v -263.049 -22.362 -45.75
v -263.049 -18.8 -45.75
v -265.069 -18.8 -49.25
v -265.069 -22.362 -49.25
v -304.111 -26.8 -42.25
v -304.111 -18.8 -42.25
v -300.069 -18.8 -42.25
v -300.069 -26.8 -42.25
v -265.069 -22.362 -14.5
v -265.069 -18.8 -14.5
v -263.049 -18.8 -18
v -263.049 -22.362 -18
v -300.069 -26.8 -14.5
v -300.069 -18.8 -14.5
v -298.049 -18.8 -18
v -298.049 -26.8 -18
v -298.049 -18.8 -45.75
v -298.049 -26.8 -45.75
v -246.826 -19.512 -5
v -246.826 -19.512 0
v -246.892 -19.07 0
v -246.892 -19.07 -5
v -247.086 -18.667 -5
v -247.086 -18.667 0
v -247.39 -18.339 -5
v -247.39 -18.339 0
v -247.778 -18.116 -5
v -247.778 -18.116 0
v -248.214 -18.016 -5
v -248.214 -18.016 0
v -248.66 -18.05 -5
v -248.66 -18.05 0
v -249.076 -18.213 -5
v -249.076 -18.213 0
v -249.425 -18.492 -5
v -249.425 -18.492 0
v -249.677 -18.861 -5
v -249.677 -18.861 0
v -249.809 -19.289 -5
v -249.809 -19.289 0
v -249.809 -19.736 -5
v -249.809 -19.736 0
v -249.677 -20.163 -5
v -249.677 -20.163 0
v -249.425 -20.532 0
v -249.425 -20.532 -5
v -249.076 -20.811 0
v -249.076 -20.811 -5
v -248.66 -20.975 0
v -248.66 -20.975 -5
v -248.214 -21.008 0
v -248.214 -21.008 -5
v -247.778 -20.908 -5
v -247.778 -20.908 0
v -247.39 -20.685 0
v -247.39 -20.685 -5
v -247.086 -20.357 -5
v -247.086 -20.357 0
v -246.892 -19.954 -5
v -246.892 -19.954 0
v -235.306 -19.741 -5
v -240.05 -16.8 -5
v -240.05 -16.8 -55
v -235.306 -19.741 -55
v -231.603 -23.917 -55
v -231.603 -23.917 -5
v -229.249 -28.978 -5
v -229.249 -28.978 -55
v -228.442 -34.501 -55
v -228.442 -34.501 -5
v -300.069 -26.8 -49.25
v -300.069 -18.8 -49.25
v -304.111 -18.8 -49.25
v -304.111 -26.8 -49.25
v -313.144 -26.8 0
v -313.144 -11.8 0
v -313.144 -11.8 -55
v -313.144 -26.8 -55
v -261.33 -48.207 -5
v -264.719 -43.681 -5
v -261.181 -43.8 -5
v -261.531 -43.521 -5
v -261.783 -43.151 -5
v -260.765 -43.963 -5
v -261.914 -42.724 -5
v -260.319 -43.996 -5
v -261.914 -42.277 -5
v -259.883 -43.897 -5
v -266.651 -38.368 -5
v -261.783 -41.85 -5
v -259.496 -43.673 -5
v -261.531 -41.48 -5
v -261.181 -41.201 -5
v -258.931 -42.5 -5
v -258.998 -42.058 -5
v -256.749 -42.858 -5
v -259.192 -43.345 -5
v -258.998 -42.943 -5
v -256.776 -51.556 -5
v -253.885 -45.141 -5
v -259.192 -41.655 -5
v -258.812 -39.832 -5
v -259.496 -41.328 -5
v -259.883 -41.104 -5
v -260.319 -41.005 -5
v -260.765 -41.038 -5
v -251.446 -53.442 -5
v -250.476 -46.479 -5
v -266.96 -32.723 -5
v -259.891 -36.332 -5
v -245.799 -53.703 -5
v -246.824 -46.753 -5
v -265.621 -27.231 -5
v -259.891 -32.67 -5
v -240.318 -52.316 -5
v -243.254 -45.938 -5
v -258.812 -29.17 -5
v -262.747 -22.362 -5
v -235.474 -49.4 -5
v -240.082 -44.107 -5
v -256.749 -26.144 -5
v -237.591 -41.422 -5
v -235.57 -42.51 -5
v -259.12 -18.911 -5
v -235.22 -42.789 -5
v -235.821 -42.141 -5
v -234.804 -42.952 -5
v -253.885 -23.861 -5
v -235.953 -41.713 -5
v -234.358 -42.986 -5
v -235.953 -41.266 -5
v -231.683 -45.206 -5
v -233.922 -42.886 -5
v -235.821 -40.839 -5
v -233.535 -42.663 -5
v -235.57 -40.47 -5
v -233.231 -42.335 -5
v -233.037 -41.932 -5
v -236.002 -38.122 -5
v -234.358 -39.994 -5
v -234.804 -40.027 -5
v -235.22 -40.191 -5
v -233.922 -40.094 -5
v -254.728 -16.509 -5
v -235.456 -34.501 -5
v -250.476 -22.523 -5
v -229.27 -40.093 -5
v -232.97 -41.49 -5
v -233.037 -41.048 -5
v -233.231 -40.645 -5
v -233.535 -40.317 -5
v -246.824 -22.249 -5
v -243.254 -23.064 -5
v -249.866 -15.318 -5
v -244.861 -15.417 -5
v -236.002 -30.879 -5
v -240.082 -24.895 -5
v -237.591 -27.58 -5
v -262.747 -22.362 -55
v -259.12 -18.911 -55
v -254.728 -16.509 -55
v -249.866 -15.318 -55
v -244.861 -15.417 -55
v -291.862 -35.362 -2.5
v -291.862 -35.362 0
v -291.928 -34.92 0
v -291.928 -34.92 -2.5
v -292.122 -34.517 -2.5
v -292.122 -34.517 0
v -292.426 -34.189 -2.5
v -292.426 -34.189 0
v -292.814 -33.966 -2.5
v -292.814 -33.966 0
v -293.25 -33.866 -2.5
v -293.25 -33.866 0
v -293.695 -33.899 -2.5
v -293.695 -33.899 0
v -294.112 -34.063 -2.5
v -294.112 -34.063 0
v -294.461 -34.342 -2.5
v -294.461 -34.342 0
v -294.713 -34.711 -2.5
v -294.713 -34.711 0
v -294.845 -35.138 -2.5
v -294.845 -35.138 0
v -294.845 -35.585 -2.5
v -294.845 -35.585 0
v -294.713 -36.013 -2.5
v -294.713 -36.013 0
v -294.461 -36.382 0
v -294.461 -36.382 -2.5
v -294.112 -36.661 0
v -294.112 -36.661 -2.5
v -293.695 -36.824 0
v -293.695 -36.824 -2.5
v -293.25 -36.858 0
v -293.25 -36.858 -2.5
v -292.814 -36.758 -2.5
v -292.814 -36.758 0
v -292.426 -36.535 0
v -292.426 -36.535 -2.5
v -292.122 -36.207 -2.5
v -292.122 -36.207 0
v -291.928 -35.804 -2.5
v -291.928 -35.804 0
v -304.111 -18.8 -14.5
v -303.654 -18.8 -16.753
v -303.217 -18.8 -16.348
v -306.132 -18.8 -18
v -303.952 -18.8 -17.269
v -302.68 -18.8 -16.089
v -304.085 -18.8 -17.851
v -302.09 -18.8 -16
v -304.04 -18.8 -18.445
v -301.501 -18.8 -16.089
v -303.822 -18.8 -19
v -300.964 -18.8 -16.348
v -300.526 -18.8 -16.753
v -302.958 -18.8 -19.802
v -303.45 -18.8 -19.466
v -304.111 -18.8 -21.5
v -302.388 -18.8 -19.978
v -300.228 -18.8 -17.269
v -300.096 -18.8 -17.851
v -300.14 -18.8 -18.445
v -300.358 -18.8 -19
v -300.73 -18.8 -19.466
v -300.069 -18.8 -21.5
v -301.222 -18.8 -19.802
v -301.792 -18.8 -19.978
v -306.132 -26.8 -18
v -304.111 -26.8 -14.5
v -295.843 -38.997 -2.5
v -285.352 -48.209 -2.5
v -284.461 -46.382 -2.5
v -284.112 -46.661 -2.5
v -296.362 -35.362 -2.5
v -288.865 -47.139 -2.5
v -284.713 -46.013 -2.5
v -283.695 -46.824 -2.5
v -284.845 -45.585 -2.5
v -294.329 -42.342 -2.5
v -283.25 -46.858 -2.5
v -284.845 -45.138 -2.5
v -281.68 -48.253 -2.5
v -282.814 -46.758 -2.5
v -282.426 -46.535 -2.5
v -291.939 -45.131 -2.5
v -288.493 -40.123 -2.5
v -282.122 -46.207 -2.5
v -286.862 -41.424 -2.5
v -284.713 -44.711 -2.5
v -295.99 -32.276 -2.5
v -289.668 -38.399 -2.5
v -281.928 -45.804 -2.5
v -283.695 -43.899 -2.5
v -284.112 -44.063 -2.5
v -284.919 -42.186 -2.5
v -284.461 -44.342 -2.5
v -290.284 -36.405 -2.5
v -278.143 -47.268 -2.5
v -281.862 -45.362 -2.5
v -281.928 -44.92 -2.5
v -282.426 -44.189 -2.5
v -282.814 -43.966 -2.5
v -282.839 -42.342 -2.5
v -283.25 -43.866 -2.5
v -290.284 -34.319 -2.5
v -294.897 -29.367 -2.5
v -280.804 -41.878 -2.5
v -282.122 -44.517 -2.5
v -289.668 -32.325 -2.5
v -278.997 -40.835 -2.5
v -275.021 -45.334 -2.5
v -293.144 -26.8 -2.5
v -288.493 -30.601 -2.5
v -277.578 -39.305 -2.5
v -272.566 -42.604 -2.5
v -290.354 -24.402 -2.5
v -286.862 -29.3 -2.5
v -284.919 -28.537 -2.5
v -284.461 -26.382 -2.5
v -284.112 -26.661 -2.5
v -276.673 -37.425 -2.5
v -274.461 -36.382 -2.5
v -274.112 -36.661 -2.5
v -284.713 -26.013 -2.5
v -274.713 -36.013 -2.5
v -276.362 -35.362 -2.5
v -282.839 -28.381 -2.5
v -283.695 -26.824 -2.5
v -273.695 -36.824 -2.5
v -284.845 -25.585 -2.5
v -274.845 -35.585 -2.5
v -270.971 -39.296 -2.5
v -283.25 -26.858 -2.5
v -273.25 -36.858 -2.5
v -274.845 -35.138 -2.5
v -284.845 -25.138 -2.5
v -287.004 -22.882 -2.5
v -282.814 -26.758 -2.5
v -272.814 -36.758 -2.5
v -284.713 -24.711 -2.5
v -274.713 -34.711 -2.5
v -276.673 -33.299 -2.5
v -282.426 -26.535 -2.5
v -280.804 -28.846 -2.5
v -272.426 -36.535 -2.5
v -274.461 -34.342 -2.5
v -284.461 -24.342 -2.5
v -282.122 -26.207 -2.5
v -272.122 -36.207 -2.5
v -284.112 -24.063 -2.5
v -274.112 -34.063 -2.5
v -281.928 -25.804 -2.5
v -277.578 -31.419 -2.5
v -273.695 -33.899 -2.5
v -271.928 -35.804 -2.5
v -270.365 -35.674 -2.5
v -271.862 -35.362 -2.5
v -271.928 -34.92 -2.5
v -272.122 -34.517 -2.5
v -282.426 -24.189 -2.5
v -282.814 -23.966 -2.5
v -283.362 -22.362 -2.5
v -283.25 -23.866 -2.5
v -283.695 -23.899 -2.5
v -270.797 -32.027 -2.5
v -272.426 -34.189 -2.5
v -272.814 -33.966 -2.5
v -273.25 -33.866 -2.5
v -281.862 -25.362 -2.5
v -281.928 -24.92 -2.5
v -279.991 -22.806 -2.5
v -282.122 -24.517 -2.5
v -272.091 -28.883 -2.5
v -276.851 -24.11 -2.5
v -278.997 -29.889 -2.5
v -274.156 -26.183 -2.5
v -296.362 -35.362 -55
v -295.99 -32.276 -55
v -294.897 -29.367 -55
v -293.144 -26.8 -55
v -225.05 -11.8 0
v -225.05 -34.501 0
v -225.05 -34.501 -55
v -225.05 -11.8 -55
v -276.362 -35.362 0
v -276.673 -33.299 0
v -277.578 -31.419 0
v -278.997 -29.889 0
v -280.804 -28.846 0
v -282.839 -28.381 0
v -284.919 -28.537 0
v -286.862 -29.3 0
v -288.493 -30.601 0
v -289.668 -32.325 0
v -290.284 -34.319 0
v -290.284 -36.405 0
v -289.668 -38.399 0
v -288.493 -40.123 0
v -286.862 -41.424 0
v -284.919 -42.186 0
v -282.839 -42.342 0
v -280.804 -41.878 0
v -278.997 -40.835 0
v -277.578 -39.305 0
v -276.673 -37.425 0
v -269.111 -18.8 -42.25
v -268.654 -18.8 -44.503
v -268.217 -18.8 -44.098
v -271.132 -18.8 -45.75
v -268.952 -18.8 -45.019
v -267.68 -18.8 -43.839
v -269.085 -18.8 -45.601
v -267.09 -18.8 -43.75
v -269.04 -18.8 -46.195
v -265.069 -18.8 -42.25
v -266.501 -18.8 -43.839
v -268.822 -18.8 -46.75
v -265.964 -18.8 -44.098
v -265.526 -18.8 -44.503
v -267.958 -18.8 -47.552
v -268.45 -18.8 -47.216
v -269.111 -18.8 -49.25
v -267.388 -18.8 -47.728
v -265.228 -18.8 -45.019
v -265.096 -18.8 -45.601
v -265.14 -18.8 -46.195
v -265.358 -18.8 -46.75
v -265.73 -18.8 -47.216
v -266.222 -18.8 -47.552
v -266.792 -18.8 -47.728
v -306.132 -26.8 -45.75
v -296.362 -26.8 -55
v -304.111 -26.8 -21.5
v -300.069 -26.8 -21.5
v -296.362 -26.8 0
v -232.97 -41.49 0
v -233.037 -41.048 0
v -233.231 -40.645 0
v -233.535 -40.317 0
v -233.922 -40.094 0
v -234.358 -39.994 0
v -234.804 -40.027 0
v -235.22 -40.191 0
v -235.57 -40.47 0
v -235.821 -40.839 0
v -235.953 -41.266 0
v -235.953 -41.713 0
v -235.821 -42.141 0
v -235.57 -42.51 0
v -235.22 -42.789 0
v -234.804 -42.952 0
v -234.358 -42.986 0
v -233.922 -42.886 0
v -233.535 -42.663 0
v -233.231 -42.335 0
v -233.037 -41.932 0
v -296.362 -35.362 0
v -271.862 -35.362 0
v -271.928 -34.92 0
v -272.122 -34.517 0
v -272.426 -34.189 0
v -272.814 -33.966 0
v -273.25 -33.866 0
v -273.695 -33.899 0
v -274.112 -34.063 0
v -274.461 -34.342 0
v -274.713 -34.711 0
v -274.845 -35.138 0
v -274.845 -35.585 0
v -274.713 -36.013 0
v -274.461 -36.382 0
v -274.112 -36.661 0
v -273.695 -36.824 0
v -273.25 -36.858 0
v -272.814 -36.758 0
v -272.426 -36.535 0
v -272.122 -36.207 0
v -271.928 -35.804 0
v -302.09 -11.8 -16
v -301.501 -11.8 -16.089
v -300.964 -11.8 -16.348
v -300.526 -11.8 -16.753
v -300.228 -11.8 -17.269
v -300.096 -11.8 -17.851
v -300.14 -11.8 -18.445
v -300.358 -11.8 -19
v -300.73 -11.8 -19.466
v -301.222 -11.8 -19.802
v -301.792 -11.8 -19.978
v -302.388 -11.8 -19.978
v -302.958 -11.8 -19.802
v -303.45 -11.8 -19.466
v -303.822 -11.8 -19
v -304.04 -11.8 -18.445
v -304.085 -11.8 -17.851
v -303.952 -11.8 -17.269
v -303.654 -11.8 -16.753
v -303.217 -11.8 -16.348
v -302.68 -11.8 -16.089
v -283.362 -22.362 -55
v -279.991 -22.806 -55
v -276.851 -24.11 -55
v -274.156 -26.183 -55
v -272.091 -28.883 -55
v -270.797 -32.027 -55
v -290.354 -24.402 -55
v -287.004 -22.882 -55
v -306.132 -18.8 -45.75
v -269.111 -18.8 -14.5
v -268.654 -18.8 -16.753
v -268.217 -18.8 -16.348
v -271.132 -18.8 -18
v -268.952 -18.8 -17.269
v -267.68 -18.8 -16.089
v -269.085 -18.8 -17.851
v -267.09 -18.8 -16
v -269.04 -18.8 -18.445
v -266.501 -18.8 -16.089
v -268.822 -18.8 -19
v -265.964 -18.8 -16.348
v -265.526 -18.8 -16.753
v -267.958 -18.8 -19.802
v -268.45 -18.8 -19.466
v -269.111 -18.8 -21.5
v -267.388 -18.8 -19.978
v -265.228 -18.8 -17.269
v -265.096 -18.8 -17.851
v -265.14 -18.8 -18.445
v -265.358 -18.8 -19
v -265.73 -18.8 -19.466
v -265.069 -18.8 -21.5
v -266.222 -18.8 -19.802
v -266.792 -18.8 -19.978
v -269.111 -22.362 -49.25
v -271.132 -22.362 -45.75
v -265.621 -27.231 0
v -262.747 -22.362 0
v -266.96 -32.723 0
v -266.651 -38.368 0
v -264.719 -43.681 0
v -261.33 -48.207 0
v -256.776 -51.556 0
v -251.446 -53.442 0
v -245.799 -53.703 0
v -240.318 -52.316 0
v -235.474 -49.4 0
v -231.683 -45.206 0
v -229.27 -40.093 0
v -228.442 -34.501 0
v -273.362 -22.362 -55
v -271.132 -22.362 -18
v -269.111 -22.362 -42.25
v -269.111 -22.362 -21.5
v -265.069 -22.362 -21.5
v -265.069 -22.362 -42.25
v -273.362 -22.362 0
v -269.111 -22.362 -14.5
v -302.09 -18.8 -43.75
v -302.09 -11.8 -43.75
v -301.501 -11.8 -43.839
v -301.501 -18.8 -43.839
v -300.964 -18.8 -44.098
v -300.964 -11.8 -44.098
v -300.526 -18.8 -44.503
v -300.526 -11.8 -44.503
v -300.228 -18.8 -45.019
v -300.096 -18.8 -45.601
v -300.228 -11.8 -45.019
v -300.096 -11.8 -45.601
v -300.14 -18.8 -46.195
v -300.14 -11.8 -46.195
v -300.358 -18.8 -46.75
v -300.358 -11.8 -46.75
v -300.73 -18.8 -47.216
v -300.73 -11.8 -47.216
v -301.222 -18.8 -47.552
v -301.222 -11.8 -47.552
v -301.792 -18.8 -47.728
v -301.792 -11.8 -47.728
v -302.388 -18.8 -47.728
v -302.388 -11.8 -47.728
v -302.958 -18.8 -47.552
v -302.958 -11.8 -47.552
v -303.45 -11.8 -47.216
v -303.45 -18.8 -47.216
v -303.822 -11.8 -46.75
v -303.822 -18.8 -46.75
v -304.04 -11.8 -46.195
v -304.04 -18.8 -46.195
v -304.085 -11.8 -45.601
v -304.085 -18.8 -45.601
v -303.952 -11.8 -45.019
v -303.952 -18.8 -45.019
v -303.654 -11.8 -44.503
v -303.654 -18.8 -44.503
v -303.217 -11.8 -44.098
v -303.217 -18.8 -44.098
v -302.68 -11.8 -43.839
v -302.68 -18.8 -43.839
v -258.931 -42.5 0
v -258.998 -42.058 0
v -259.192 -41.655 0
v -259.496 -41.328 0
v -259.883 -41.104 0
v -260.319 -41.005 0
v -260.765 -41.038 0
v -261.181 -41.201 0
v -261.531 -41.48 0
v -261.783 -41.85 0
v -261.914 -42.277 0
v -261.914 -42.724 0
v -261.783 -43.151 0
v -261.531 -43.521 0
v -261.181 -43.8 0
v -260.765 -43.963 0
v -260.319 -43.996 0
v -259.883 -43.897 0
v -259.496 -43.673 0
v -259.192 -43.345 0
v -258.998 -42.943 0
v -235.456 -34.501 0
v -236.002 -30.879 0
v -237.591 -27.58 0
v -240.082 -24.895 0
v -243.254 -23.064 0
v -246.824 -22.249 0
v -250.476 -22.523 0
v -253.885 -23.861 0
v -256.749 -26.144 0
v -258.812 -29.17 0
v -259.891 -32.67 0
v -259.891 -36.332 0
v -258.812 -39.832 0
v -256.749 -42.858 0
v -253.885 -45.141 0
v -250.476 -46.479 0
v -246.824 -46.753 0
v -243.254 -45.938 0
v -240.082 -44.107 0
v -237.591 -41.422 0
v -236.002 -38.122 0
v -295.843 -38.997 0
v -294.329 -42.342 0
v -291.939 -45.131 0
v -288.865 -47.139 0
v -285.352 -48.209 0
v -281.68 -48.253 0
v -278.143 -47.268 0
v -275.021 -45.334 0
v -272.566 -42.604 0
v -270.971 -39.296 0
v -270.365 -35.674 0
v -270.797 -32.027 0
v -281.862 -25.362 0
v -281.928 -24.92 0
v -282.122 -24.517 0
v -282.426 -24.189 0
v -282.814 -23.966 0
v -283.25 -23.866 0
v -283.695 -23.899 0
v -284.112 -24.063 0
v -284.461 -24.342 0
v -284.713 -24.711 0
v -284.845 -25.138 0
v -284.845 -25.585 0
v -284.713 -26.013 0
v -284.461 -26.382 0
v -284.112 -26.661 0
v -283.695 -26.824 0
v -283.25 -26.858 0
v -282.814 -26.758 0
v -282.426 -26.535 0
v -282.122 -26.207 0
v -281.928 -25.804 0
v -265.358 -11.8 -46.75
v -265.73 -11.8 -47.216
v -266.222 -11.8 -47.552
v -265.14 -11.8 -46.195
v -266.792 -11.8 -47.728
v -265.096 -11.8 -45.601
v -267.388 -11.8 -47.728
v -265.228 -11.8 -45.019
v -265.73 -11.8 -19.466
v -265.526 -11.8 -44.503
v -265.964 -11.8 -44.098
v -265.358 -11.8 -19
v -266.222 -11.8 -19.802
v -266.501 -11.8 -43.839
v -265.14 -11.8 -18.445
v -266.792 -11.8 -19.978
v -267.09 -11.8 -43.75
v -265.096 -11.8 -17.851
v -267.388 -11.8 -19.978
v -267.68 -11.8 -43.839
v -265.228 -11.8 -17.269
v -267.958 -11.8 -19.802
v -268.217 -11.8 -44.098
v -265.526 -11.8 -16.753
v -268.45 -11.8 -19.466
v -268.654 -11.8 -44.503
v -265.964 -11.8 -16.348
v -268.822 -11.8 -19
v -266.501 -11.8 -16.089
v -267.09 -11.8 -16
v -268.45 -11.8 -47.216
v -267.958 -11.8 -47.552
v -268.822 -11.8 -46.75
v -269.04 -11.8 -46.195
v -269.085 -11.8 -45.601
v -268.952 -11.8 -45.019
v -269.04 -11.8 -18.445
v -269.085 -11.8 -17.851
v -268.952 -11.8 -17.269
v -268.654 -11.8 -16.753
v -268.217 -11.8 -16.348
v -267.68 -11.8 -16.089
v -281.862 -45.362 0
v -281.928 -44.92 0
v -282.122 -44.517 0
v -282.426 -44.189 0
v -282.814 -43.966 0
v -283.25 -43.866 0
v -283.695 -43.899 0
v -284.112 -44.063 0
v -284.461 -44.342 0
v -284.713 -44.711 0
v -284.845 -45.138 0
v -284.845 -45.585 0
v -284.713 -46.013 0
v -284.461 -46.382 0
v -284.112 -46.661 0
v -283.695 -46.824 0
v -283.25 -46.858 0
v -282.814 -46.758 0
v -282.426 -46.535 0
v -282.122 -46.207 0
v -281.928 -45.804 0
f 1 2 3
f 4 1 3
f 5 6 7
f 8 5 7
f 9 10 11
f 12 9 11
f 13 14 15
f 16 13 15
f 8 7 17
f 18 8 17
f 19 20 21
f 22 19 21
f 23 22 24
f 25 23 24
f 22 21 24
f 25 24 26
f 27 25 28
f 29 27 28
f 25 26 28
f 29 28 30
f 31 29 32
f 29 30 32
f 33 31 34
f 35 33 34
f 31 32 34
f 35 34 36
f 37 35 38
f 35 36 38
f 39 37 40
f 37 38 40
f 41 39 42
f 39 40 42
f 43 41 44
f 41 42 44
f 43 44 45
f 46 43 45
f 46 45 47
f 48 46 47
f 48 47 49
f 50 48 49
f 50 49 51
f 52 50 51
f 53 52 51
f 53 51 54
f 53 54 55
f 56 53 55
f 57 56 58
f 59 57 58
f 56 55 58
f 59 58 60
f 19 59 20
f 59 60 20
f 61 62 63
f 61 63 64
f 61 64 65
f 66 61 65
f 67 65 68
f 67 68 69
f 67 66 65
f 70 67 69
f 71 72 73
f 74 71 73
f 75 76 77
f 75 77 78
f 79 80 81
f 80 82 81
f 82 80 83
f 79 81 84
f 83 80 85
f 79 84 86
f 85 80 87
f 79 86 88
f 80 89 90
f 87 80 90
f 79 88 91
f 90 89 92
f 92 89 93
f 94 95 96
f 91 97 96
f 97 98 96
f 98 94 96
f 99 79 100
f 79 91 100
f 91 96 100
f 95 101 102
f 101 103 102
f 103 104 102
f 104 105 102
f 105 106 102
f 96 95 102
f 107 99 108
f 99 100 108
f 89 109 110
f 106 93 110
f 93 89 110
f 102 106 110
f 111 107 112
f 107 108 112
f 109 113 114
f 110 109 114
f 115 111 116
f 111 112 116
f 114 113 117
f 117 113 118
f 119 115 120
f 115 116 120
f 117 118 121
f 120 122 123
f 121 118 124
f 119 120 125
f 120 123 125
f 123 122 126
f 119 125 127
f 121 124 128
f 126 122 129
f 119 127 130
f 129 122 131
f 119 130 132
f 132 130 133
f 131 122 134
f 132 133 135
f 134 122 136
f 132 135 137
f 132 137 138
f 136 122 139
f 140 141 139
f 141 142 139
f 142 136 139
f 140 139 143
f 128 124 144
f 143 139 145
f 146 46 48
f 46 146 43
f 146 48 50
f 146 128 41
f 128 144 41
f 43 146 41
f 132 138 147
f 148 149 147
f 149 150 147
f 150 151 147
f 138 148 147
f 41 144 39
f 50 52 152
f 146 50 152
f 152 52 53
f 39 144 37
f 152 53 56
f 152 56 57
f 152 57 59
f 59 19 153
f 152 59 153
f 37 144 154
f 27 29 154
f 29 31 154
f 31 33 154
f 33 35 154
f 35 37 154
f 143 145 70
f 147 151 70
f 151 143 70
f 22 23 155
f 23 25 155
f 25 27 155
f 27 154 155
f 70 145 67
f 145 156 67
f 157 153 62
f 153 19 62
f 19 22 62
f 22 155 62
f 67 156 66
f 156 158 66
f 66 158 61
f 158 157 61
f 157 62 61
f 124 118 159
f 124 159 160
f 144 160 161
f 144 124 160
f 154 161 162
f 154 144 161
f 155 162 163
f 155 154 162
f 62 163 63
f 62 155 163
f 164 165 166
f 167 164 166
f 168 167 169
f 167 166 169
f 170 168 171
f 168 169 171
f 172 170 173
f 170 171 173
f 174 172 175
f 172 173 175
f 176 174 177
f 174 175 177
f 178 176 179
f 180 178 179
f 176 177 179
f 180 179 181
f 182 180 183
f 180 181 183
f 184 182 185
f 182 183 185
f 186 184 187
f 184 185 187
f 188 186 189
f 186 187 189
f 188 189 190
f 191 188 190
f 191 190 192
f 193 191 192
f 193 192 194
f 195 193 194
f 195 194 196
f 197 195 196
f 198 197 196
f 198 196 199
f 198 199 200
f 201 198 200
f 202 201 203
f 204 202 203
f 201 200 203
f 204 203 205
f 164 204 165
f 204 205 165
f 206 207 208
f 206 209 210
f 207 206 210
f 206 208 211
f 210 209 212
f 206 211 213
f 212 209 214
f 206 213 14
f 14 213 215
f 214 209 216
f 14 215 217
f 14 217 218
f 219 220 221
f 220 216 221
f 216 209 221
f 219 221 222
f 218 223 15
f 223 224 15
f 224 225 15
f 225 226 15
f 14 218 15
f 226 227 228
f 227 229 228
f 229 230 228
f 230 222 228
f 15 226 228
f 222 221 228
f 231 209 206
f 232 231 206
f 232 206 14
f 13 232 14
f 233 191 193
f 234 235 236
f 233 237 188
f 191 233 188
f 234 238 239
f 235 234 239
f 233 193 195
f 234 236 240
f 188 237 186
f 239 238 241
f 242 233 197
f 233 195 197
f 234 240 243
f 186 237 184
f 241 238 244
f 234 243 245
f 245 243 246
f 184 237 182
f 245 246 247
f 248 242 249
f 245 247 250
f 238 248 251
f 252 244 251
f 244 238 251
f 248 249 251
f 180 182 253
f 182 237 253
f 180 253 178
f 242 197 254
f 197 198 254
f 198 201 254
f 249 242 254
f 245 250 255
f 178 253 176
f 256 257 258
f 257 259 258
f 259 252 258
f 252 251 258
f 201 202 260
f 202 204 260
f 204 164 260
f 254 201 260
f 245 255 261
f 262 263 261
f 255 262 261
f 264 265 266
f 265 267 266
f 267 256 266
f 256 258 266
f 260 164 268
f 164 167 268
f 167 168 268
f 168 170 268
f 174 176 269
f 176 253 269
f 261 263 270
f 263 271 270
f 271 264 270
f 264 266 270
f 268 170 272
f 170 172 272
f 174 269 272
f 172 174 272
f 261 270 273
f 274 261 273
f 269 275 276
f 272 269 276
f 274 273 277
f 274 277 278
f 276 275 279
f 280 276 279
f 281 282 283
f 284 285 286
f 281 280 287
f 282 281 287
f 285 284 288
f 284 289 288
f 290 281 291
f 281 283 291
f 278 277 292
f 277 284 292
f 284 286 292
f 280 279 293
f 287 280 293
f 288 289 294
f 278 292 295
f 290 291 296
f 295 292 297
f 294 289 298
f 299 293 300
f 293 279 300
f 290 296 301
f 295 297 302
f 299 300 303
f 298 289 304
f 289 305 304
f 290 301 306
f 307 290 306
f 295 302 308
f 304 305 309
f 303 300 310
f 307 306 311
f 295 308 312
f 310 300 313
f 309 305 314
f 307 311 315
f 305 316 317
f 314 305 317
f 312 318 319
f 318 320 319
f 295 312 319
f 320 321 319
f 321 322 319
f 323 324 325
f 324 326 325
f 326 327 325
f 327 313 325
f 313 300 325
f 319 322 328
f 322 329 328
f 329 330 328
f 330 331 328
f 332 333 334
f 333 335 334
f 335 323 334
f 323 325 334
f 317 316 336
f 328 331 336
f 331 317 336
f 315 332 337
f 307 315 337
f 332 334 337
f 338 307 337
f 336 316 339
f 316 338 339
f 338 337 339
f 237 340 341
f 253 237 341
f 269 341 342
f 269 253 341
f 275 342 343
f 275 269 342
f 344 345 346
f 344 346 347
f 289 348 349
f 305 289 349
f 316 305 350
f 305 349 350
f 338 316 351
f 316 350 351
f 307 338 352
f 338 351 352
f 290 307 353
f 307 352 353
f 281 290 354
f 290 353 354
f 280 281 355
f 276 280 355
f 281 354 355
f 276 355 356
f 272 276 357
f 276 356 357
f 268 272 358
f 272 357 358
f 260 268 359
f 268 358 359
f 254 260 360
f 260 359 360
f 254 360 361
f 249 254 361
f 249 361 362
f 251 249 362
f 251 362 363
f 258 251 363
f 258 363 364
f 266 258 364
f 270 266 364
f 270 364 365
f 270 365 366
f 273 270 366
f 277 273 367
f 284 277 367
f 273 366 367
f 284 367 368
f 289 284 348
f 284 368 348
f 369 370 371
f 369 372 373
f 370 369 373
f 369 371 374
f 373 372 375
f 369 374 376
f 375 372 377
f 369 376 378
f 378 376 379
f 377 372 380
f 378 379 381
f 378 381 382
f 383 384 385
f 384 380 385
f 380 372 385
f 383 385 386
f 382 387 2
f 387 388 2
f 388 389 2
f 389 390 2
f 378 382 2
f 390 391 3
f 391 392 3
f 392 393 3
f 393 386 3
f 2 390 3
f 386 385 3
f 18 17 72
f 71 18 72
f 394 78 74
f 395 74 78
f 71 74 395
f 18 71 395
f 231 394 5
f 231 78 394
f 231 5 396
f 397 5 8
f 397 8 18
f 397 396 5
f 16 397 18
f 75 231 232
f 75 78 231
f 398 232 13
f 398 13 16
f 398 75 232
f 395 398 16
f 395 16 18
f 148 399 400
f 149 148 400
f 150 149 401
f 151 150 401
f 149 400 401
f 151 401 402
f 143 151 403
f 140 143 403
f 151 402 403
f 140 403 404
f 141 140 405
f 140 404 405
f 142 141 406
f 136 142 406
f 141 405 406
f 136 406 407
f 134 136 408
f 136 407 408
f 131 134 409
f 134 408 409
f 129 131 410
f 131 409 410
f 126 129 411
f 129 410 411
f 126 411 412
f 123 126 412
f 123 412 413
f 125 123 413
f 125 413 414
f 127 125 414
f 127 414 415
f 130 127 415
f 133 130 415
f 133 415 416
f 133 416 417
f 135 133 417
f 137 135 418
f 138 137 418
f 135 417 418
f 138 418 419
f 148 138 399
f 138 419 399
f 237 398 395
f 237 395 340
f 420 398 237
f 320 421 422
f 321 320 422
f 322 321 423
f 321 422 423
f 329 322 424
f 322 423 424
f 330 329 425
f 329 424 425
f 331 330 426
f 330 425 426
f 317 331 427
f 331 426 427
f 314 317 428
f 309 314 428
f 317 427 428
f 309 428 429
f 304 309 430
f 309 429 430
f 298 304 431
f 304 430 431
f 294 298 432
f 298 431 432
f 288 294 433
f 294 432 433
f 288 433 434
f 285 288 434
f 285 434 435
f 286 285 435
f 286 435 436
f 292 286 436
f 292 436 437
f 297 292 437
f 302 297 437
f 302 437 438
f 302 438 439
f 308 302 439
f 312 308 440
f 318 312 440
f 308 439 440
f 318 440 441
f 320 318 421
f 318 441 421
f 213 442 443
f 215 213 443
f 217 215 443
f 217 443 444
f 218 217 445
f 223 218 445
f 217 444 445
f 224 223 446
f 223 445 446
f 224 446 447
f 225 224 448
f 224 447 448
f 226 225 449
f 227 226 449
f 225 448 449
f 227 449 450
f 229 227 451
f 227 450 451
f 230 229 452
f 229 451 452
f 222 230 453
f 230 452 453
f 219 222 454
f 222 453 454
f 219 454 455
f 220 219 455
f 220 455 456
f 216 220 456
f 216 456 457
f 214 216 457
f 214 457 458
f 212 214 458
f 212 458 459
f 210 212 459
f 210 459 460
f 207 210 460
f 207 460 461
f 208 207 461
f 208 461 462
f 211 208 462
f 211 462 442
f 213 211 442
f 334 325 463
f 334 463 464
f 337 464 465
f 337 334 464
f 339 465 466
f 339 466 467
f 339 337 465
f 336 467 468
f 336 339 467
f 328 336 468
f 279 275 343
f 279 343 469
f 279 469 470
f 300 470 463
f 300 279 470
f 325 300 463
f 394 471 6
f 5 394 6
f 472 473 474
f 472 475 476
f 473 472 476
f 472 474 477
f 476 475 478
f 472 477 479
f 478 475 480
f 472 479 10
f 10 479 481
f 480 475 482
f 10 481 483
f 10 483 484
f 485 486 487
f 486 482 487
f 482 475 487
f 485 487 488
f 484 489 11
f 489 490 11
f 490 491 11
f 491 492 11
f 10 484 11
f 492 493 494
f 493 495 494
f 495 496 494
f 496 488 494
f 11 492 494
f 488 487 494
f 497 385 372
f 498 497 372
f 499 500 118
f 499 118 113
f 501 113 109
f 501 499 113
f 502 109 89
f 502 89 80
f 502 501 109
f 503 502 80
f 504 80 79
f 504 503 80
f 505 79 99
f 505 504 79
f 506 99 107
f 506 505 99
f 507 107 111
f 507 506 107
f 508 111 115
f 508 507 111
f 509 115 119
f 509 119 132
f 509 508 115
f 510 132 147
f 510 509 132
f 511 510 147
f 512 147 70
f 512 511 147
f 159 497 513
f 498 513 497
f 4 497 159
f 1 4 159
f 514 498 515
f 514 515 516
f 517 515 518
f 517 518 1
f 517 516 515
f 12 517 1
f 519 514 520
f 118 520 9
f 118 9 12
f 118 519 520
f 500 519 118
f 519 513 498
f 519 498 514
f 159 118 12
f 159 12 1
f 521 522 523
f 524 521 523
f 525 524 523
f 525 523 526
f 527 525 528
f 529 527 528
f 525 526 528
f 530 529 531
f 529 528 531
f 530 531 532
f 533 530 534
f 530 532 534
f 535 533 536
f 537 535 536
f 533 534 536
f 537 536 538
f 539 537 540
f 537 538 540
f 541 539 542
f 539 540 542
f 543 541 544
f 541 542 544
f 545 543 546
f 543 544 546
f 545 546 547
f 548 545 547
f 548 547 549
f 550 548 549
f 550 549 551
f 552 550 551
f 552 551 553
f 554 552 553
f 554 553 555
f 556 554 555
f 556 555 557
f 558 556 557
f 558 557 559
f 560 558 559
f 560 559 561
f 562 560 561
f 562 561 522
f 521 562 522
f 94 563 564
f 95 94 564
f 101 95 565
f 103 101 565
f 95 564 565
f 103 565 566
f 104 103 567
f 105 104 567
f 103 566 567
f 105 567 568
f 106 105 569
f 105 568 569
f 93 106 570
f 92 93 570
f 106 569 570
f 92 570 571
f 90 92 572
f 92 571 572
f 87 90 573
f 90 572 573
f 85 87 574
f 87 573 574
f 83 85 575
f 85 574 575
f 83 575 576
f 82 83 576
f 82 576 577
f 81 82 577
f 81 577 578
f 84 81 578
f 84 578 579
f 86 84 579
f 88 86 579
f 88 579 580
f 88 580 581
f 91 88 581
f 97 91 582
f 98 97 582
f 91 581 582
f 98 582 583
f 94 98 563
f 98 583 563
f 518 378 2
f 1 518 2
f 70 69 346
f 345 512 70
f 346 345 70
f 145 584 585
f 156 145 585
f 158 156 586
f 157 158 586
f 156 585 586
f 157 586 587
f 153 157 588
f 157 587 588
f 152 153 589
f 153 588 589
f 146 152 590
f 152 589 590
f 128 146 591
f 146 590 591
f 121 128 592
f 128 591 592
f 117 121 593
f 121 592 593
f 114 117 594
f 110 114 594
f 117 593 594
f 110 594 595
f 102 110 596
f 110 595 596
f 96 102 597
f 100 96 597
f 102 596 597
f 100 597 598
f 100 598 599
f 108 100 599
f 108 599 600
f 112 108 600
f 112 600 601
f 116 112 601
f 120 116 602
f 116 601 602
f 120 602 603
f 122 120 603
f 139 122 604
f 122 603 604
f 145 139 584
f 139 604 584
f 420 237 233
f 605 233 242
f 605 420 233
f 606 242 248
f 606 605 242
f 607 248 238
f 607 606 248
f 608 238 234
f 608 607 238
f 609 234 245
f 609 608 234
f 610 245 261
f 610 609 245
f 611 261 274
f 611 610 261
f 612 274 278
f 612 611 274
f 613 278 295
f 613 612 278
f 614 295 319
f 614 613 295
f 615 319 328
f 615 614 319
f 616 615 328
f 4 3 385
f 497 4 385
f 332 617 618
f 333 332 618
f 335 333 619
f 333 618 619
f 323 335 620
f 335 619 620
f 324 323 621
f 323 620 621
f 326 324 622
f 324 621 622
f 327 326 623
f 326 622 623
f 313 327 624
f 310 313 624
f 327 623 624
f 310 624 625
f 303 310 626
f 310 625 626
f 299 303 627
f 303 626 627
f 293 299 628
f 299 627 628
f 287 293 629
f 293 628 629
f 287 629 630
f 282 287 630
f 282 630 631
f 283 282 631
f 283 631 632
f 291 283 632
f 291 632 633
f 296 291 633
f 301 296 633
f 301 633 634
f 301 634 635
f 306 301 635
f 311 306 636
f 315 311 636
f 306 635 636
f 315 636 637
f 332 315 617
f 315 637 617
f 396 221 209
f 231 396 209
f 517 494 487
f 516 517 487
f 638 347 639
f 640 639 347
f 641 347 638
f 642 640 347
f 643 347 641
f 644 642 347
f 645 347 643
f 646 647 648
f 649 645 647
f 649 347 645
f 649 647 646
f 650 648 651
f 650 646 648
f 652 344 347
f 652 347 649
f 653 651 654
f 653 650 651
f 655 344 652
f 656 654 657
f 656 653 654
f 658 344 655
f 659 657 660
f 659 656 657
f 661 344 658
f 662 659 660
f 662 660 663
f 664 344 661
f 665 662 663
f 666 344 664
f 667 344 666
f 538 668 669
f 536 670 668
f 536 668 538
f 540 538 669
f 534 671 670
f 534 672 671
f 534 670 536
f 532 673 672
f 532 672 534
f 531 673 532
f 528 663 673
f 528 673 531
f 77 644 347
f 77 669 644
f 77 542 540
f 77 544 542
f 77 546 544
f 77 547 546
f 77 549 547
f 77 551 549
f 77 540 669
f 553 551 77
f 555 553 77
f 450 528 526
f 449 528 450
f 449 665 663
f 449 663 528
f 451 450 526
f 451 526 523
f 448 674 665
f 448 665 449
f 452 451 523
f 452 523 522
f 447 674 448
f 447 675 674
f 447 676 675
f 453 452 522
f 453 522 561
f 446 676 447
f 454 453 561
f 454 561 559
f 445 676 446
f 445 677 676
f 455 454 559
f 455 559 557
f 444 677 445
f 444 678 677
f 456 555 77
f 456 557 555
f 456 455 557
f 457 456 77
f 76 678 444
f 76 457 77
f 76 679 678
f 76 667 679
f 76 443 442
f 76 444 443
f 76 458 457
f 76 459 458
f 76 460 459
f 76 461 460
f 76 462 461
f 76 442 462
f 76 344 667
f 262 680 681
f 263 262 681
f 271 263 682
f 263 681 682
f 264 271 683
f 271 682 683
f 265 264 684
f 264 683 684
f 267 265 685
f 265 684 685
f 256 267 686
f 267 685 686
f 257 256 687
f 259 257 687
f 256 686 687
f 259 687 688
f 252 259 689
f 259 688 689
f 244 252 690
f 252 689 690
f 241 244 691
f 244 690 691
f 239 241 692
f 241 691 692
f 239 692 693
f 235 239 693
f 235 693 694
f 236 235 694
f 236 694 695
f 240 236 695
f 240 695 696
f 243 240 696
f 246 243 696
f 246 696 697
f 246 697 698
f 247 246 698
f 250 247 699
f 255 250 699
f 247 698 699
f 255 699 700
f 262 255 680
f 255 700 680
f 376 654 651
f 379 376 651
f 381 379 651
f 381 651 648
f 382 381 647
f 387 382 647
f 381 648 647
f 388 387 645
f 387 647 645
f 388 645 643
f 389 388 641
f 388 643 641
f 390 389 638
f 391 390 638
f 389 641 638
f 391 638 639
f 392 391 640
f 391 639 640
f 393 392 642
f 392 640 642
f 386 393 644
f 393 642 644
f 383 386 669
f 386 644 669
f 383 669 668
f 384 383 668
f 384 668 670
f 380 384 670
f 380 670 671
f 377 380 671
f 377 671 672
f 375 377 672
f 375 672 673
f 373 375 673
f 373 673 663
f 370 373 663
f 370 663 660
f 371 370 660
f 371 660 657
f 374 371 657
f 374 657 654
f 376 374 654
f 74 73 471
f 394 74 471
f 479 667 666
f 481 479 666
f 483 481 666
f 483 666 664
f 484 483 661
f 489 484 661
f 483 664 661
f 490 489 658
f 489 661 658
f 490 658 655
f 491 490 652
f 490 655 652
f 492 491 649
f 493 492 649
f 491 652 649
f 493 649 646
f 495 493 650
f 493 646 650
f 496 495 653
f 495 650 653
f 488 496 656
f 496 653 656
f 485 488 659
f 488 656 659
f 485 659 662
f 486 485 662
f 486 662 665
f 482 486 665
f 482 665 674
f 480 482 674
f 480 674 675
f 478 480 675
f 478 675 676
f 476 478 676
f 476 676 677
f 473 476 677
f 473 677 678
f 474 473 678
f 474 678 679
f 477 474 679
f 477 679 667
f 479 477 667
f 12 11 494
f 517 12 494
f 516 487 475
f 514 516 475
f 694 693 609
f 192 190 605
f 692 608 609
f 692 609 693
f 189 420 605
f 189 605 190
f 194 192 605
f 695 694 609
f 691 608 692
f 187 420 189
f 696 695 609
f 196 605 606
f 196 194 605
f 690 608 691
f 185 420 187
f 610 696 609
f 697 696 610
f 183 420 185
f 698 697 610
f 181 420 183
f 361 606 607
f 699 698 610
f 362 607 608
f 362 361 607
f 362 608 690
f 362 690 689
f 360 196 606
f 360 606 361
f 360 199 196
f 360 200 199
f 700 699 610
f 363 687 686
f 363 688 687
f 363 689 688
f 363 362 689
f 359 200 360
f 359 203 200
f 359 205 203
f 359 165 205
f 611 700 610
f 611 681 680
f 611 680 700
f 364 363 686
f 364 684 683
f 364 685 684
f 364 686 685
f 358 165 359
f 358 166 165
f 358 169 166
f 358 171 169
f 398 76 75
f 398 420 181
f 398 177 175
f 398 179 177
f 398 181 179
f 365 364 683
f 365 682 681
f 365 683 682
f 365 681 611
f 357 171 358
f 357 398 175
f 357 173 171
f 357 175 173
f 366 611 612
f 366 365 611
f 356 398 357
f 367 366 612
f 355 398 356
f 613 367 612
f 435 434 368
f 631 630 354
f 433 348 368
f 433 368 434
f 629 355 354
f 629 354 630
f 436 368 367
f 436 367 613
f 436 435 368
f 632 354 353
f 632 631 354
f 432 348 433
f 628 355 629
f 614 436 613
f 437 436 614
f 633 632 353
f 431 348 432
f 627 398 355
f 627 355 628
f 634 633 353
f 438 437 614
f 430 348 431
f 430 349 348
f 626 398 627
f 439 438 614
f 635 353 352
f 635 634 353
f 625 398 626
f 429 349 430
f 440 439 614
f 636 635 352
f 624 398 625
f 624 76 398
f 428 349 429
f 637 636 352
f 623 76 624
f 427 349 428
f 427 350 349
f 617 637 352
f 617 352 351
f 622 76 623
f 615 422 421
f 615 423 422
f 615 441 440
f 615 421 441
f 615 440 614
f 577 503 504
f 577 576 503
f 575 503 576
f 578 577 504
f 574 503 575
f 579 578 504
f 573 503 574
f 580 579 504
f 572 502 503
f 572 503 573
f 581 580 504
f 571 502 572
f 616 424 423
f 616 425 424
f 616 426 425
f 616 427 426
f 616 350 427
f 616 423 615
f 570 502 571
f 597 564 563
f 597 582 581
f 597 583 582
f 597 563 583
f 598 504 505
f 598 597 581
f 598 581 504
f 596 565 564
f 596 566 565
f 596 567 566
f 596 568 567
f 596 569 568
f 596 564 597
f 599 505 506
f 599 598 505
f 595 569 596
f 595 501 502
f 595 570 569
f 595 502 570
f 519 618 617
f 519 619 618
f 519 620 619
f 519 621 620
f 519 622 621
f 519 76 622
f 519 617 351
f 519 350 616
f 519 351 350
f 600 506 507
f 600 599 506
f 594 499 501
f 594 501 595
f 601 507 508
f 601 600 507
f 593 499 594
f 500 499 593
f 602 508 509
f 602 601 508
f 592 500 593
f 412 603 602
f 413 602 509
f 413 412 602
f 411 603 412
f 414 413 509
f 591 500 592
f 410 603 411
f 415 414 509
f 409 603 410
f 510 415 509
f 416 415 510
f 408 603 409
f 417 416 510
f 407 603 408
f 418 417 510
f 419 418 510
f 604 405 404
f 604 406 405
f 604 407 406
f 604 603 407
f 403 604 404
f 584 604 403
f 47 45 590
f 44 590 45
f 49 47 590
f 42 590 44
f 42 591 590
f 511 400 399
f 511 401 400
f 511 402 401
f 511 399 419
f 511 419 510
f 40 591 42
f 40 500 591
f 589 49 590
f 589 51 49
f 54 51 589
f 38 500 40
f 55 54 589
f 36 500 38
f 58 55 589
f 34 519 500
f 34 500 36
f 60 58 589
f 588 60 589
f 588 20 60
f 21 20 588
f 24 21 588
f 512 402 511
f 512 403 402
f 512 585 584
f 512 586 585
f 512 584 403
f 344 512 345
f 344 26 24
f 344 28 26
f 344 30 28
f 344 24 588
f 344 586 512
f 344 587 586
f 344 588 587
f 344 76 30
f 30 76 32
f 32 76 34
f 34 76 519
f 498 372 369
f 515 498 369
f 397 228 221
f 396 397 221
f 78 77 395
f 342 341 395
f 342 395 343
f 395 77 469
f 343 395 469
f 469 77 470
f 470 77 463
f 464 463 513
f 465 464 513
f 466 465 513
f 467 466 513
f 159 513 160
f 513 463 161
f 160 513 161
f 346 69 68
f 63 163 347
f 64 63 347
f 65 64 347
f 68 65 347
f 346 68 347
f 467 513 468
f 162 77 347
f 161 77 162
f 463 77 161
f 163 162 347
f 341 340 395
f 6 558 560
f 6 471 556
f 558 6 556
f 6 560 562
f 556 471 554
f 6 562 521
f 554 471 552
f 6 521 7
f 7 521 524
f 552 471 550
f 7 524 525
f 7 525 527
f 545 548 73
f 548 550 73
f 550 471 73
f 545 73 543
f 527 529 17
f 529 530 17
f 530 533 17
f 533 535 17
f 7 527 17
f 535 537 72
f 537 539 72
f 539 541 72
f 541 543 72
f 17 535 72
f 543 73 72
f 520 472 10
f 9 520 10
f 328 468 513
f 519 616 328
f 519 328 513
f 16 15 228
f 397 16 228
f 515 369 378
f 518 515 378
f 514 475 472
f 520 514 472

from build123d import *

# Parameters (mm, degrees)
SKETCH1_R           = 1.5
SKETCH1_R_2         = 12.286192875
BOSS_EXTRUDE1_DEPTH = 5
SKETCH1_4_R         = 19.3
SKETCH1_4_R_2       = 1.5
SKETCH1_4_R_3       = 12.286192875
BOSS_EXTRUDE2_DEPTH = 5
SKETCH1_5_R         = 13
SKETCH1_5_R_2       = 1.5
SKETCH1_5_R_3       = 7
BOSS_EXTRUDE3_DEPTH = 2.5
BOSS_EXTRUDE4_DEPTH = 55
SKETCH2_R           = 2
CUT_EXTRUDE1_DEPTH  = 321.699634413
CUT_EXTRUDE2_START  = -7
SKETCH2_3_R         = 2
CUT_EXTRUDE2_DEPTH  = 8


with BuildPart() as part:
    # Sketch1 → Boss-Extrude1 (new body)
    with BuildSketch(Plane.XY):
        with BuildLine():
            Line((-225.050004998, -11.8), (-313.144033158, -11.8))
            Line((-313.144033158, -11.8), (-313.144033158, -26.8))
            Line((-313.144033158, -26.8), (-296.361685959, -26.8))
            Line((-296.361685959, -26.8), (-296.361685959, -35.361873818))
            ThreePointArc((-296.361685959, -35.361873818), (-292.554074115, -26.169485663), (-283.361685959, -22.361873818))
            Line((-283.361685959, -22.361873818), (-262.746762324, -22.361873818))
            ThreePointArc((-262.746762324, -22.361873818), (-254.180514838, -52.695300476), (-228.442241035, -34.500833448))
            Line((-228.442241035, -34.500833448), (-225.050004998, -34.500833448))
            Line((-225.050004998, -34.500833448), (-225.050004998, -11.8))
        make_face()
        with Locations((-234.469948601, -41.489842931)):
            Circle(SKETCH1_R, mode=Mode.SUBTRACT)
        with Locations((-248.325727491, -19.512186292)):
            Circle(SKETCH1_R, mode=Mode.SUBTRACT)
        with Locations((-260.431047012, -42.50047112)):
            Circle(SKETCH1_R, mode=Mode.SUBTRACT)
        with Locations((-247.742241035, -34.500833448)):
            Circle(SKETCH1_R_2, mode=Mode.SUBTRACT)
    extrude(amount=-BOSS_EXTRUDE1_DEPTH)

    # Sketch1<4> → Boss-Extrude2 (add)
    # profile 1 of 3: a face of its own
    with BuildSketch(Plane.XY):
        with Locations((-247.742241035, -34.500833448)):
            Circle(SKETCH1_4_R)
        with Locations((-248.325727491, -19.512186292)):
            Circle(SKETCH1_4_R_2, mode=Mode.SUBTRACT)
        with Locations((-260.431047012, -42.50047112)):
            Circle(SKETCH1_4_R_2, mode=Mode.SUBTRACT)
        with Locations((-234.469948601, -41.489842931)):
            Circle(SKETCH1_4_R_2, mode=Mode.SUBTRACT)
        with Locations((-247.742241035, -34.500833448)):
            Circle(SKETCH1_4_R_3, mode=Mode.SUBTRACT)
    # profile 2 of 3: a face of its own
    with BuildSketch(Plane.XY):
        with BuildLine():
            Line((-225.050004998, -16.8), (-225.050004998, -11.8))
            Line((-225.050004998, -11.8), (-313.144033158, -11.8))
            Line((-313.144033158, -11.8), (-313.144033158, -26.8))
            Line((-313.144033158, -26.8), (-296.361685959, -26.8))
            Line((-296.361685959, -26.8), (-293.144033158, -26.8))
            ThreePointArc((-293.144033158, -26.8), (-288.73270264, -23.523285228), (-283.361685959, -22.361873818))
            Line((-283.361685959, -22.361873818), (-273.361685959, -22.361873818))
            Line((-273.361685959, -22.361873818), (-262.746762324, -22.361873818))
            ThreePointArc((-262.746762324, -22.361873818), (-252.335822317, -15.755460392), (-240.050004998, -16.8))
            Line((-240.050004998, -16.8), (-225.050004998, -16.8))
        make_face()
    # profile 3 of 3: a face of its own
    with BuildSketch(Plane.XY):
        with BuildLine():
            Line((-225.050004998, -34.500833448), (-225.050004998, -16.8))
            Line((-225.050004998, -16.8), (-240.050004998, -16.8))
            ThreePointArc((-240.050004998, -16.8), (-231.603000726, -23.917123217), (-228.442241035, -34.500833448))
            Line((-228.442241035, -34.500833448), (-225.050004998, -34.500833448))
        make_face()
    extrude(amount=-BOSS_EXTRUDE2_DEPTH)

    # Sketch1<5> → Boss-Extrude3 (add)
    with BuildSketch(Plane.XY):
        with Locations((-283.361685959, -35.361873818)):
            Circle(SKETCH1_5_R)
        with Locations((-283.361685959, -25.361873818)):
            Circle(SKETCH1_5_R_2, mode=Mode.SUBTRACT)
        with Locations((-293.361685959, -35.361873818)):
            Circle(SKETCH1_5_R_2, mode=Mode.SUBTRACT)
        with Locations((-283.361685959, -45.361873818)):
            Circle(SKETCH1_5_R_2, mode=Mode.SUBTRACT)
        with Locations((-273.361685959, -35.361873818)):
            Circle(SKETCH1_5_R_2, mode=Mode.SUBTRACT)
        with Locations((-283.361685959, -35.361873818)):
            Circle(SKETCH1_5_R_3, mode=Mode.SUBTRACT)
    extrude(amount=-BOSS_EXTRUDE3_DEPTH)

    # Sketch1<6> → Boss-Extrude4 (add)
    with BuildSketch(Plane.XY):
        with BuildLine():
            Line((-270.796630197, -32.027301328), (-273.361685959, -22.361873818))
            Line((-273.361685959, -22.361873818), (-283.361685959, -22.361873818))
            ThreePointArc((-283.361685959, -22.361873818), (-275.435446068, -25.05776196), (-270.796630197, -32.027301328))
        make_face()
        with BuildLine():
            Line((-225.050004998, -34.500833448), (-225.050004998, -16.8))
            Line((-225.050004998, -16.8), (-240.050004998, -16.8))
            ThreePointArc((-240.050004998, -16.8), (-231.603000726, -23.917123217), (-228.442241035, -34.500833448))
            Line((-228.442241035, -34.500833448), (-225.050004998, -34.500833448))
        make_face()
        with BuildLine():
            Line((-293.144033158, -26.8), (-296.361685959, -26.8))
            Line((-296.361685959, -26.8), (-296.361685959, -35.361873818))
            ThreePointArc((-296.361685959, -35.361873818), (-295.530714548, -30.788609863), (-293.144033158, -26.8))
        make_face()
        with BuildLine():
            Line((-225.050004998, -16.8), (-225.050004998, -11.8))
            Line((-225.050004998, -11.8), (-313.144033158, -11.8))
            Line((-313.144033158, -11.8), (-313.144033158, -26.8))
            Line((-313.144033158, -26.8), (-296.361685959, -26.8))
            Line((-296.361685959, -26.8), (-293.144033158, -26.8))
            ThreePointArc((-293.144033158, -26.8), (-288.73270264, -23.523285228), (-283.361685959, -22.361873818))
            Line((-283.361685959, -22.361873818), (-273.361685959, -22.361873818))
            Line((-273.361685959, -22.361873818), (-262.746762324, -22.361873818))
            ThreePointArc((-262.746762324, -22.361873818), (-252.335822317, -15.755460392), (-240.050004998, -16.8))
            Line((-240.050004998, -16.8), (-225.050004998, -16.8))
        make_face()
    extrude(amount=-BOSS_EXTRUDE4_DEPTH)

    # Sketch2 → Cut-Extrude1 (cut, through all)
    with BuildSketch(Plane(origin=(0, -11.8, 0), x_dir=(1, 0, 0), z_dir=(0, 1, 0))):
        with Locations(Location((-302.09015188, 45.75, 0), (0, 0, 270))):
            Circle(SKETCH2_R)
        with Locations(Location((-302.09015188, 18, 0), (0, 0, 270))):
            Circle(SKETCH2_R)
        with Locations(Location((-267.09015188, 18, 0), (0, 0, 270))):
            Circle(SKETCH2_R)
        with Locations(Location((-267.09015188, 45.75, 0), (0, 0, 270))):
            Circle(SKETCH2_R)
    extrude(amount=-CUT_EXTRUDE1_DEPTH, mode=Mode.SUBTRACT)

    # Sketch2<3> → Cut-Extrude2 (cut)
    # profile 1 of 4: a face of its own
    with BuildSketch(Plane(origin=(0, -11.8, 0), x_dir=(1, 0, 0), z_dir=(0, 1, 0)).offset(CUT_EXTRUDE2_START)):
        Polygon((-300.069425938, 42.25), (-298.048699996, 45.75), (-300.069425938, 49.25), (-304.110877823, 49.25), (-306.131603765, 45.75), (-304.110877823, 42.25), align=None)
        with Locations(Location((-302.09015188, 45.75, 0), (0, 0, 270))):
            Circle(SKETCH2_3_R, mode=Mode.SUBTRACT)
    # profile 2 of 4: a face of its own
    with BuildSketch(Plane(origin=(0, -11.8, 0), x_dir=(1, 0, 0), z_dir=(0, 1, 0)).offset(CUT_EXTRUDE2_START)):
        Polygon((-300.069425938, 14.5), (-298.048699996, 18), (-300.069425938, 21.5), (-304.110877823, 21.5), (-306.131603765, 18), (-304.110877823, 14.5), align=None)
        with Locations(Location((-302.09015188, 18, 0), (0, 0, 270))):
            Circle(SKETCH2_3_R, mode=Mode.SUBTRACT)
    # profile 3 of 4: a face of its own
    with BuildSketch(Plane(origin=(0, -11.8, 0), x_dir=(1, 0, 0), z_dir=(0, 1, 0)).offset(CUT_EXTRUDE2_START)):
        Polygon((-269.110877823, 21.5), (-271.131603765, 18), (-269.110877823, 14.5), (-265.069425938, 14.5), (-263.048699996, 18), (-265.069425938, 21.5), align=None)
        with Locations(Location((-267.09015188, 18, 0), (0, 0, 270))):
            Circle(SKETCH2_3_R, mode=Mode.SUBTRACT)
    # profile 4 of 4: a face of its own
    with BuildSketch(Plane(origin=(0, -11.8, 0), x_dir=(1, 0, 0), z_dir=(0, 1, 0)).offset(CUT_EXTRUDE2_START)):
        Polygon((-269.110877823, 42.25), (-265.069425938, 42.25), (-263.048699996, 45.75), (-265.069425938, 49.25), (-269.110877823, 49.25), (-271.131603765, 45.75), align=None)
        with Locations(Location((-267.09015188, 45.75, 0), (0, 0, 270))):
            Circle(SKETCH2_3_R, mode=Mode.SUBTRACT)
    extrude(amount=-CUT_EXTRUDE2_DEPTH, mode=Mode.SUBTRACT)


solid = part.part
